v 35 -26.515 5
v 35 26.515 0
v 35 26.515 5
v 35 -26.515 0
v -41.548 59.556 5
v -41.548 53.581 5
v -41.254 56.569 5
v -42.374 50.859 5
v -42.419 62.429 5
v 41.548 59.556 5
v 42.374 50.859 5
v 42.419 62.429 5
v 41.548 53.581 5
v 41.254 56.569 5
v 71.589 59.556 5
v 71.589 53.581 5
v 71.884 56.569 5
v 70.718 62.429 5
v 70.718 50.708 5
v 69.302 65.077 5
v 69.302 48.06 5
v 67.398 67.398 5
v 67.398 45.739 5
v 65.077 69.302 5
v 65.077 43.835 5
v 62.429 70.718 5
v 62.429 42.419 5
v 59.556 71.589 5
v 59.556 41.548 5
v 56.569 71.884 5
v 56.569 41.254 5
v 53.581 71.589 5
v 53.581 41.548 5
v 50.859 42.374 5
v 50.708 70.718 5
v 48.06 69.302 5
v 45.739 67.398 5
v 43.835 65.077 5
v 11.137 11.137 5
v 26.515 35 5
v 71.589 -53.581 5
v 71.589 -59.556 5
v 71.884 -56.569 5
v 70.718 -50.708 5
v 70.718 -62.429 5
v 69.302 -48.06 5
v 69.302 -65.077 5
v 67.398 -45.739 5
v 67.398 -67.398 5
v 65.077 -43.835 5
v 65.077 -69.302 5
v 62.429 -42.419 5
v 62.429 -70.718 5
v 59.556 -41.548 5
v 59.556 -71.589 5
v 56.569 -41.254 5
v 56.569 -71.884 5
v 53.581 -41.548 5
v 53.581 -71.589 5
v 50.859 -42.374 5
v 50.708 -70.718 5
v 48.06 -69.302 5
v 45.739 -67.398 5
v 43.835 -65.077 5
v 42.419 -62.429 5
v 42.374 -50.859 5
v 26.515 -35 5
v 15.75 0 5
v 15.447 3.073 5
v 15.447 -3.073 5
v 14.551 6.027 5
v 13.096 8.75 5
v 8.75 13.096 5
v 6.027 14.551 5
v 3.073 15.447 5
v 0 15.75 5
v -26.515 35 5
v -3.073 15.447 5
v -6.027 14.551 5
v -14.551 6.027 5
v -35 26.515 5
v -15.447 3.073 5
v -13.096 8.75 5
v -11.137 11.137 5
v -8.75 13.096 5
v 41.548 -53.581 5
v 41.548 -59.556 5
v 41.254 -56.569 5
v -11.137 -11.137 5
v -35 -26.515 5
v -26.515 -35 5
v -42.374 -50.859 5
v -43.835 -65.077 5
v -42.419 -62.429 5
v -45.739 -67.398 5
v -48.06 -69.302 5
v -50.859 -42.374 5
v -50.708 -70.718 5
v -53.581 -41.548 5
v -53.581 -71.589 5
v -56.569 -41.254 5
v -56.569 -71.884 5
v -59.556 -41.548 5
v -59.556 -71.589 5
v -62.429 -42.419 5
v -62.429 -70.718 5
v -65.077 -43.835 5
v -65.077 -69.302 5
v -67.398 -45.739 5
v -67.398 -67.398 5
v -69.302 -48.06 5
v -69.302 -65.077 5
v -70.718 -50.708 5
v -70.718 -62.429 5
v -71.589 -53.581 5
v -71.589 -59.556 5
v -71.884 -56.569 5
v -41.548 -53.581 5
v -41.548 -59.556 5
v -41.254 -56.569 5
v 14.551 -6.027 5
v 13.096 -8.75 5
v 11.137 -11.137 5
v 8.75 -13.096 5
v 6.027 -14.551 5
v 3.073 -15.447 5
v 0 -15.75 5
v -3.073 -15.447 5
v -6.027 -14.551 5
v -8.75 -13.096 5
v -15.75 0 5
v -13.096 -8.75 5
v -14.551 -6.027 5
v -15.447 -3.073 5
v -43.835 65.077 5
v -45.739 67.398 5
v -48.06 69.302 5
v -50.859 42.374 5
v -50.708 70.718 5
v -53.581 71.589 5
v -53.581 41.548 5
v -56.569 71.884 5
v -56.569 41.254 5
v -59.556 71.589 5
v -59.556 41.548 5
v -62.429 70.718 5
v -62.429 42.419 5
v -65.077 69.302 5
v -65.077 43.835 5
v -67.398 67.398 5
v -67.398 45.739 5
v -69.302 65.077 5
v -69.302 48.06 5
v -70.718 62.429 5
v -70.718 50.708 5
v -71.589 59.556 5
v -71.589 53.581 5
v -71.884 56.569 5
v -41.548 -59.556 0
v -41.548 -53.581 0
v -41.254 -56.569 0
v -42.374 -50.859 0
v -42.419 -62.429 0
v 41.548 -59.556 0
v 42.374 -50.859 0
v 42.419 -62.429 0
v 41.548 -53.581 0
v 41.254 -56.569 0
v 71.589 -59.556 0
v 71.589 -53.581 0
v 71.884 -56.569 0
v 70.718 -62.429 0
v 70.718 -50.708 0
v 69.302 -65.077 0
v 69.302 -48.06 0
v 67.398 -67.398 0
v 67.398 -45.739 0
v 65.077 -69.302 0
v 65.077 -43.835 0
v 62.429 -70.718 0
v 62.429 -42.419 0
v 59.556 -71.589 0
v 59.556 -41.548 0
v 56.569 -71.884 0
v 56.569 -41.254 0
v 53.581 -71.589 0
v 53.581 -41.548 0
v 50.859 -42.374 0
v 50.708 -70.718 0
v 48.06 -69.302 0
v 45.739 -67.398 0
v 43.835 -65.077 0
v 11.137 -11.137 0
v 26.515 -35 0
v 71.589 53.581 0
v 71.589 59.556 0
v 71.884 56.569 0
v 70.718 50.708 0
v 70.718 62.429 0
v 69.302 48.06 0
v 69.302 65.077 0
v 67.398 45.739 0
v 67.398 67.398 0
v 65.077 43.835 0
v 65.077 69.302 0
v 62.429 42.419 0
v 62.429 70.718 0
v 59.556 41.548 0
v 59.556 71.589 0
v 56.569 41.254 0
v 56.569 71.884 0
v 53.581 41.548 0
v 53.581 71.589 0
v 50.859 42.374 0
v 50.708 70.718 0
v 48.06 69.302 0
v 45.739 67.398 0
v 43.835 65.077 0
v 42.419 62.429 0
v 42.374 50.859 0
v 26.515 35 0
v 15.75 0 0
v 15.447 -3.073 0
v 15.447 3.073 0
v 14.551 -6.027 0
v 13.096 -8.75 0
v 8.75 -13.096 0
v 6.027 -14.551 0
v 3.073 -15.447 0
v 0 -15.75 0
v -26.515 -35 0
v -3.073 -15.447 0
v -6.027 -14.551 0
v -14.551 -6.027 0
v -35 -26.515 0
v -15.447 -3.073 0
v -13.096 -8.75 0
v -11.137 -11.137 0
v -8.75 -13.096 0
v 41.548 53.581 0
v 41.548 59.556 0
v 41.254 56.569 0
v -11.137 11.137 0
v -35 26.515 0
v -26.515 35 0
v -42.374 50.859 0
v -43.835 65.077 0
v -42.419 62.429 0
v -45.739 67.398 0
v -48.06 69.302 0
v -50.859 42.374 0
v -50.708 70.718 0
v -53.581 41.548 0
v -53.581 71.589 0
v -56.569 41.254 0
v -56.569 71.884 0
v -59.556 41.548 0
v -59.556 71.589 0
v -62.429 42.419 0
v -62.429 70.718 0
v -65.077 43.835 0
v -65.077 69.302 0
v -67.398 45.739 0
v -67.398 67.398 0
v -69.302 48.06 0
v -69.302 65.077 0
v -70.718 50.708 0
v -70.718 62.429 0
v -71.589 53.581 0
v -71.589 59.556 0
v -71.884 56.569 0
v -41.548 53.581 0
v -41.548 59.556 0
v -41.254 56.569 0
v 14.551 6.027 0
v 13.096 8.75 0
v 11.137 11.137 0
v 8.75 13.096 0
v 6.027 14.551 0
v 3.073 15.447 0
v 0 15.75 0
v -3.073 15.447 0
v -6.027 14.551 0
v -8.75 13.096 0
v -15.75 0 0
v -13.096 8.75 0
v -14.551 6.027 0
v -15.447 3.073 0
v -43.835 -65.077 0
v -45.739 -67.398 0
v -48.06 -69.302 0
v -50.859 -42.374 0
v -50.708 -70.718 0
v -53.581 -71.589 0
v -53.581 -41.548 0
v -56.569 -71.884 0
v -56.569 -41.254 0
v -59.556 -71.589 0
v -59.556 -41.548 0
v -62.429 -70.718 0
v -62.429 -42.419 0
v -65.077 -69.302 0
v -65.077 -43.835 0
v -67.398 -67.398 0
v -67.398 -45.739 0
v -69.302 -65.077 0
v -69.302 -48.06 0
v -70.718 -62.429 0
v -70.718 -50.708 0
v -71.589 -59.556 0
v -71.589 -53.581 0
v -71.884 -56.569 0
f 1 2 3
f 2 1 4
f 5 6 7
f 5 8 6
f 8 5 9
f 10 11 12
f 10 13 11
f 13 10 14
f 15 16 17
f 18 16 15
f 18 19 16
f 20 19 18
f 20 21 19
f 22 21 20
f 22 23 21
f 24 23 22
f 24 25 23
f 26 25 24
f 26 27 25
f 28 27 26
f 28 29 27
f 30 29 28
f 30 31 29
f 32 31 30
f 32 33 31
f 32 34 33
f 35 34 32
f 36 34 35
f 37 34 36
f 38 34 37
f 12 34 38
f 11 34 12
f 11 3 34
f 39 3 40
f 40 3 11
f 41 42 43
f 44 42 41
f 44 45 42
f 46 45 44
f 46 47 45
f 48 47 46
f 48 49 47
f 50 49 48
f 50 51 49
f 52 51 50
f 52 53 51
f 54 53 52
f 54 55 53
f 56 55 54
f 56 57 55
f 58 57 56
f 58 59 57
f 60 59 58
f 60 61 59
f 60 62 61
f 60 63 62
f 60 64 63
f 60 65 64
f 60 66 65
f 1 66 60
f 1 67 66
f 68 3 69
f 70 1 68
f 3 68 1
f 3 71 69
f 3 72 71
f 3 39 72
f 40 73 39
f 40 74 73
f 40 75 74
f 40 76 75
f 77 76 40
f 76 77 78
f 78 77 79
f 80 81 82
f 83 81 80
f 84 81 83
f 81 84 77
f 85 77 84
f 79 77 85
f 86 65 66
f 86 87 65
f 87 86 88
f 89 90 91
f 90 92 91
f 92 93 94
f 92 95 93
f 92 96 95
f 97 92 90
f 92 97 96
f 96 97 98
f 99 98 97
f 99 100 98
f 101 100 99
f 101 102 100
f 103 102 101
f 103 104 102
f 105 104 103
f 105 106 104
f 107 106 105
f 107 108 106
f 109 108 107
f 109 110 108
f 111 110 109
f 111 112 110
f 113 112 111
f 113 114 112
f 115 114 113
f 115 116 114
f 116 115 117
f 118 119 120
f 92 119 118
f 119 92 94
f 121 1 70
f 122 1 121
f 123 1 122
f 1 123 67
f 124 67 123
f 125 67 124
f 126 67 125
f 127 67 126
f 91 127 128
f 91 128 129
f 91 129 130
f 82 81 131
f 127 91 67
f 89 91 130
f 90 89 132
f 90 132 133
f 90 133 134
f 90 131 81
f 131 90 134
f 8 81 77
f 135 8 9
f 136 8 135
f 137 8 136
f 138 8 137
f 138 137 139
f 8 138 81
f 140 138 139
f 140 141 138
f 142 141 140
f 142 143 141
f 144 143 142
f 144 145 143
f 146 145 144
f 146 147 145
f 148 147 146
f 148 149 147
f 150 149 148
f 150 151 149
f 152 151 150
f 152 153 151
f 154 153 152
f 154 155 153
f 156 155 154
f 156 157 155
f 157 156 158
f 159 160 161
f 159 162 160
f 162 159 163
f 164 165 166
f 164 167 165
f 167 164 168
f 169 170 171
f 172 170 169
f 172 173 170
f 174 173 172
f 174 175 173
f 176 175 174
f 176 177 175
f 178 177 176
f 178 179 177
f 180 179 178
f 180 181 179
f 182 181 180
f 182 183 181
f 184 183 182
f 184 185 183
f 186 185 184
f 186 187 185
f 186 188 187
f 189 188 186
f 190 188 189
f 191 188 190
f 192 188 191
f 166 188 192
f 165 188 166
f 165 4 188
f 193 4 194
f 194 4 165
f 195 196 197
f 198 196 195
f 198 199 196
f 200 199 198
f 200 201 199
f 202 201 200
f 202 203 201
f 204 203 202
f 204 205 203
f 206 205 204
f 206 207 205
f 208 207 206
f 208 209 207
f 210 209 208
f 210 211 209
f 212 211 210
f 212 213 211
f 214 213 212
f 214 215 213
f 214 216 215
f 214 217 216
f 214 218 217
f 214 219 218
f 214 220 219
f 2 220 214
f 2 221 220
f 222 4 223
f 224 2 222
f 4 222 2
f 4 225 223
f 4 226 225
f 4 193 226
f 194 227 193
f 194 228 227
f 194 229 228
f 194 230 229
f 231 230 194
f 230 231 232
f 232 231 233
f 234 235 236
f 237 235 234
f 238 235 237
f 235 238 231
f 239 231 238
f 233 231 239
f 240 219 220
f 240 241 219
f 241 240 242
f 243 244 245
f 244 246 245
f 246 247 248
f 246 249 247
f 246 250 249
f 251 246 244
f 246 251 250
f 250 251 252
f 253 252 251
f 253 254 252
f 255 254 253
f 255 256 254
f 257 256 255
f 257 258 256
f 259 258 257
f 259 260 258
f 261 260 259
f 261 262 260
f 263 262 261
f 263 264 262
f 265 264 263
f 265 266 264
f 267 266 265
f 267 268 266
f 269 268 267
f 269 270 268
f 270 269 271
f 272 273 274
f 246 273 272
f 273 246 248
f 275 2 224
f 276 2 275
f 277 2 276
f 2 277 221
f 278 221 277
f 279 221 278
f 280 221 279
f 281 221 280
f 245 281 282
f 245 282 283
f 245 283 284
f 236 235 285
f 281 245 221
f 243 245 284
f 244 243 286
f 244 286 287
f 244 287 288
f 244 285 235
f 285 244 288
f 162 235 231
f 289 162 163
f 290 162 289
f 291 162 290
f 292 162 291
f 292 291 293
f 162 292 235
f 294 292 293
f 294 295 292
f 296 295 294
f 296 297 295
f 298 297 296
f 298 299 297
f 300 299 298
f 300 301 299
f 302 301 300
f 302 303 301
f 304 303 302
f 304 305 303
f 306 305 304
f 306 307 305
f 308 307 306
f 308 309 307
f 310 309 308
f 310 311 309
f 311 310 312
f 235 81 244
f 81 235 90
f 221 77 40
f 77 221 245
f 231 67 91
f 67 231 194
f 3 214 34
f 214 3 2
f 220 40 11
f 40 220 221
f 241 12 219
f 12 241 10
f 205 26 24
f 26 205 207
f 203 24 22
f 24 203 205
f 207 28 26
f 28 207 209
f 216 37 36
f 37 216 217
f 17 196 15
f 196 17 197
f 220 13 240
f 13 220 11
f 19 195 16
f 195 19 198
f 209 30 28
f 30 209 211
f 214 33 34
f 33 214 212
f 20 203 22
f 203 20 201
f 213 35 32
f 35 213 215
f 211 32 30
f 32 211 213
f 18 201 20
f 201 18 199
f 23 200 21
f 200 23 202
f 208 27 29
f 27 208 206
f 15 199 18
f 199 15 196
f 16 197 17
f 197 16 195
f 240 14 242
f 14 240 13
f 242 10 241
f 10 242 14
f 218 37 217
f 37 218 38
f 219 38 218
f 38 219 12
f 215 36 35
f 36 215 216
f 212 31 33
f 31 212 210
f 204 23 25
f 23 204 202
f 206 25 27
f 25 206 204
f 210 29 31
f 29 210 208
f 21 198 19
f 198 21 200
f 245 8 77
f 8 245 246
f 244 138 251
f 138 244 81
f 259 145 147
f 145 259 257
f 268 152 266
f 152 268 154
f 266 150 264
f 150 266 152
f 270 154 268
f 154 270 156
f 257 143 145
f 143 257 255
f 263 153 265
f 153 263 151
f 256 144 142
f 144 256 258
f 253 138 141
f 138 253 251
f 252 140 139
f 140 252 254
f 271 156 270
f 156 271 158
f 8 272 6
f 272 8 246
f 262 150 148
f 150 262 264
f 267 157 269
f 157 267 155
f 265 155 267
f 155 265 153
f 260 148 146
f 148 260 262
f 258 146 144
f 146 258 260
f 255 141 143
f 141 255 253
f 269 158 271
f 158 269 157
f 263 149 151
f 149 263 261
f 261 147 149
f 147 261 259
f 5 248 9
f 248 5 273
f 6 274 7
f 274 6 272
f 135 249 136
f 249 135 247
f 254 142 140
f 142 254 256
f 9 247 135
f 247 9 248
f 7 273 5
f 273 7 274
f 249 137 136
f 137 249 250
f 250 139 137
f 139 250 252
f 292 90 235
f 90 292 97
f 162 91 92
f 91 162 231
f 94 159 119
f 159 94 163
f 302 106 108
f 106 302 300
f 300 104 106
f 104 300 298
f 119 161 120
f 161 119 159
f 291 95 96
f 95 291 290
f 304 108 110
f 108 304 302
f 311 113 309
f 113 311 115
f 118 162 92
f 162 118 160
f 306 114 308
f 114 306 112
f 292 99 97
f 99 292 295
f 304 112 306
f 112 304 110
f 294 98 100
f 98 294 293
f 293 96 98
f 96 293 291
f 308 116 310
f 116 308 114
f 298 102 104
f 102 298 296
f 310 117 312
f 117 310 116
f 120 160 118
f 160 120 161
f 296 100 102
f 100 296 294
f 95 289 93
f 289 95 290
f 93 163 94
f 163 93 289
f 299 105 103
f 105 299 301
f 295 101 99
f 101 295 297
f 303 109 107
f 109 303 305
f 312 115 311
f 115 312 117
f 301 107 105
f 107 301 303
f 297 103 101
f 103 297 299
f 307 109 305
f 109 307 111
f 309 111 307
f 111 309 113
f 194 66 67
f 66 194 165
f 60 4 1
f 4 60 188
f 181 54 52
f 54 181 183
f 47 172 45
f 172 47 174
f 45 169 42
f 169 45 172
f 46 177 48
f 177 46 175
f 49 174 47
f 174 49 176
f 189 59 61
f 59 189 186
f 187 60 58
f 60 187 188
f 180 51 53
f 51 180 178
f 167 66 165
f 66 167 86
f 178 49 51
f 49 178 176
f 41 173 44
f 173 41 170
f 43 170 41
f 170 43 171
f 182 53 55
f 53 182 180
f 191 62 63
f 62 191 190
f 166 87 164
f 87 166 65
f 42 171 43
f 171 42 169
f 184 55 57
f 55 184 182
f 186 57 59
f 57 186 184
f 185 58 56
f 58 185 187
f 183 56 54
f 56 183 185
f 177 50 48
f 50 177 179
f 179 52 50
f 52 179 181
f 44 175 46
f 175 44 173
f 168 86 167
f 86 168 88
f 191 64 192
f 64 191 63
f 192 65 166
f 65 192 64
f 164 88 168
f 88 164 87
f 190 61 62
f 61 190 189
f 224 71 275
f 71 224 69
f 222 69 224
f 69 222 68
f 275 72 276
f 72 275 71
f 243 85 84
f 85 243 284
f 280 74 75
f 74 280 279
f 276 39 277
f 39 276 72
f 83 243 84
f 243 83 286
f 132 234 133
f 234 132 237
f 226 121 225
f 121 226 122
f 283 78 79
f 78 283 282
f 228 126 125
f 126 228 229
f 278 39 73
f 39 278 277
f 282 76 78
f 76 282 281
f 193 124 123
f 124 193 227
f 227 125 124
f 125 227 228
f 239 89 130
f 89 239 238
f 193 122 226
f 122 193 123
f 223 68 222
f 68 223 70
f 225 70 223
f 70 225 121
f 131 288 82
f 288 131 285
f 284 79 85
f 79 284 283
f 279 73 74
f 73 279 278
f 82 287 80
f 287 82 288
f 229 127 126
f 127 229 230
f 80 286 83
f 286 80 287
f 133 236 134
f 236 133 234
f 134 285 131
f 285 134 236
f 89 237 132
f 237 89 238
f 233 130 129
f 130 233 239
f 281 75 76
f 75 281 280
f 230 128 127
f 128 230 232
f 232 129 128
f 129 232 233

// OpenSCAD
$fn = 32;

// ----------------------------------------------------------------------
// Quadcopter frame: 190.62 mm across the motor pads, arms 80 mm
// ----------------------------------------------------------------------

// --- parameters (mm) ---
hub = 70;                 // central plate size
plate_t = 5;              // plate thickness
arm_len = 80;             // hub centre to motor pad centre
bar_w = 12;               // arm width
pad_d = 30.63;            // motor pad diameter
centre_d = 31.5;          // central cut-out for the stack

module arm_bar() {
  /* flat bar: hull of a stub inside the hub and a box at the pad */
  hull() {
    translate([hub / 4, 0, plate_t / 2]) cube([bar_w, bar_w, plate_t], center = true);
    translate([arm_len, 0, plate_t / 2]) cube([bar_w, bar_w, plate_t], center = true);
  }
}

module pad() {
  translate([arm_len, 0, 0]) cylinder(h = plate_t, d = pad_d);
}

module frame() {
  translate([-hub / 2, -hub / 2, 0]) cube([hub, hub, plate_t]);
  rotate([0, 0, 45]) arm_bar();
  rotate([0, 0, 45]) pad();
  rotate([0, 0, 135]) arm_bar();
  rotate([0, 0, 135]) pad();
  rotate([0, 0, 225]) arm_bar();
  rotate([0, 0, 225]) pad();
  rotate([0, 0, 315]) arm_bar();
  rotate([0, 0, 315]) pad();
}

difference() {
  frame();
  translate([0, 0, -1]) cylinder(h = plate_t + 2, d = centre_d);
}
